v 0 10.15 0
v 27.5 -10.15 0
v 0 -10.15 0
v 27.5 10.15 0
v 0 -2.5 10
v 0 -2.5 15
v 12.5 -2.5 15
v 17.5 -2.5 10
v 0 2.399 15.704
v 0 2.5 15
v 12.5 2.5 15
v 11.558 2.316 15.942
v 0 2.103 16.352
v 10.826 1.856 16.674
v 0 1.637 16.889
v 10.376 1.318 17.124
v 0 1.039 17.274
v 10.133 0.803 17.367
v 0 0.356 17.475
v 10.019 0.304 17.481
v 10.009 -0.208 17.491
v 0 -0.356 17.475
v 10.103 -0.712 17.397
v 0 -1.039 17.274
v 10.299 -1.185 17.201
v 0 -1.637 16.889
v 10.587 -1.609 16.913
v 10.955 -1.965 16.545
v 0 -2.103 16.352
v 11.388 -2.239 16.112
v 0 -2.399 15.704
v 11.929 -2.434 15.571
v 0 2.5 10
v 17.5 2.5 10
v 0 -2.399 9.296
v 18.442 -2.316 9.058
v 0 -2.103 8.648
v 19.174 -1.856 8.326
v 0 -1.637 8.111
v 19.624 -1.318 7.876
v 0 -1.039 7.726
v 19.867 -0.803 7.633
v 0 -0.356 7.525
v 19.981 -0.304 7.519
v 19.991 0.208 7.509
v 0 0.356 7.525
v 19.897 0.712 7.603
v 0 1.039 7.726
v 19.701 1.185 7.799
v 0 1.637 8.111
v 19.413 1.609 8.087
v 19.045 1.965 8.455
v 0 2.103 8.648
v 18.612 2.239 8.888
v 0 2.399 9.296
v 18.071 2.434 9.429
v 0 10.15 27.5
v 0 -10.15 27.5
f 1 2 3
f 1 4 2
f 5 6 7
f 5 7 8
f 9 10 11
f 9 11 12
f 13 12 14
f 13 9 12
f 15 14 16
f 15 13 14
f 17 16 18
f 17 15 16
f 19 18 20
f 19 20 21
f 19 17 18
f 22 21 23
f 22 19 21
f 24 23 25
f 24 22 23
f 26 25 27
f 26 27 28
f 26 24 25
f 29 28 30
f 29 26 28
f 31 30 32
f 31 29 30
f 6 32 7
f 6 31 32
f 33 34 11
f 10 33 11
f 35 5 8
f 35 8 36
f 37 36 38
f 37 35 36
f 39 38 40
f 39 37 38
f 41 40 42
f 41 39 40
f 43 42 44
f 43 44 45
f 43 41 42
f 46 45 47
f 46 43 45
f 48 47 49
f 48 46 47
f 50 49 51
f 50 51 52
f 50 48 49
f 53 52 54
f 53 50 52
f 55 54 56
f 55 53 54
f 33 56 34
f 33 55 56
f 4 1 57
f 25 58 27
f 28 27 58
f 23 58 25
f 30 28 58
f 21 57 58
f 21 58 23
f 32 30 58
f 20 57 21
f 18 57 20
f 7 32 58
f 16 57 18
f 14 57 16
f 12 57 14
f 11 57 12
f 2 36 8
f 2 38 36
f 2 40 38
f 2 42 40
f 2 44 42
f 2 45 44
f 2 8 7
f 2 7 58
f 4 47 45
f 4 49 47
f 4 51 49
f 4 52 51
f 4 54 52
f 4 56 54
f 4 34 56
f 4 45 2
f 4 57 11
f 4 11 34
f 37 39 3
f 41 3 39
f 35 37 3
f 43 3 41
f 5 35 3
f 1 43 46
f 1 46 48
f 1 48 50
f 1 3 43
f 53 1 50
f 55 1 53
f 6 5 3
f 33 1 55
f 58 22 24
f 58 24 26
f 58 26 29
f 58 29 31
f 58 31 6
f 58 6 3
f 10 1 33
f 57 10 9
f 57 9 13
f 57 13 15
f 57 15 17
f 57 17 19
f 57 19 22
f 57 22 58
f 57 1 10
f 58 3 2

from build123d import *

# Parameters (mm, degrees)
BOSS_EXTRUDE1_DEPTH = 10.15
CUT_EXTRUDE1_DEPTH  = 20.3


with BuildPart() as part:
    # Sketch1 → Boss-Extrude1 (new, symmetric)
    with BuildSketch(Plane(origin=(0, 0, 0), x_dir=(1, 0, 0), z_dir=(0, 1, 0))):
        Polygon((0, 0), (0, -27.5), (27.5, 0), align=None)
    extrude(amount=BOSS_EXTRUDE1_DEPTH, both=True)

    # Sketch2 → Cut-Extrude1 (cut)
    with BuildSketch(Plane.ZY):
        with BuildLine():
            Line((15, -2.5), (10, -2.5))
            ThreePointArc((10, -2.5), (7.5, 0), (10, 2.5))
            Line((10, 2.5), (15, 2.5))
            ThreePointArc((15, 2.5), (17.5, 0), (15, -2.5))
        make_face()
    extrude(amount=-CUT_EXTRUDE1_DEPTH, mode=Mode.SUBTRACT)


solid = part.part
